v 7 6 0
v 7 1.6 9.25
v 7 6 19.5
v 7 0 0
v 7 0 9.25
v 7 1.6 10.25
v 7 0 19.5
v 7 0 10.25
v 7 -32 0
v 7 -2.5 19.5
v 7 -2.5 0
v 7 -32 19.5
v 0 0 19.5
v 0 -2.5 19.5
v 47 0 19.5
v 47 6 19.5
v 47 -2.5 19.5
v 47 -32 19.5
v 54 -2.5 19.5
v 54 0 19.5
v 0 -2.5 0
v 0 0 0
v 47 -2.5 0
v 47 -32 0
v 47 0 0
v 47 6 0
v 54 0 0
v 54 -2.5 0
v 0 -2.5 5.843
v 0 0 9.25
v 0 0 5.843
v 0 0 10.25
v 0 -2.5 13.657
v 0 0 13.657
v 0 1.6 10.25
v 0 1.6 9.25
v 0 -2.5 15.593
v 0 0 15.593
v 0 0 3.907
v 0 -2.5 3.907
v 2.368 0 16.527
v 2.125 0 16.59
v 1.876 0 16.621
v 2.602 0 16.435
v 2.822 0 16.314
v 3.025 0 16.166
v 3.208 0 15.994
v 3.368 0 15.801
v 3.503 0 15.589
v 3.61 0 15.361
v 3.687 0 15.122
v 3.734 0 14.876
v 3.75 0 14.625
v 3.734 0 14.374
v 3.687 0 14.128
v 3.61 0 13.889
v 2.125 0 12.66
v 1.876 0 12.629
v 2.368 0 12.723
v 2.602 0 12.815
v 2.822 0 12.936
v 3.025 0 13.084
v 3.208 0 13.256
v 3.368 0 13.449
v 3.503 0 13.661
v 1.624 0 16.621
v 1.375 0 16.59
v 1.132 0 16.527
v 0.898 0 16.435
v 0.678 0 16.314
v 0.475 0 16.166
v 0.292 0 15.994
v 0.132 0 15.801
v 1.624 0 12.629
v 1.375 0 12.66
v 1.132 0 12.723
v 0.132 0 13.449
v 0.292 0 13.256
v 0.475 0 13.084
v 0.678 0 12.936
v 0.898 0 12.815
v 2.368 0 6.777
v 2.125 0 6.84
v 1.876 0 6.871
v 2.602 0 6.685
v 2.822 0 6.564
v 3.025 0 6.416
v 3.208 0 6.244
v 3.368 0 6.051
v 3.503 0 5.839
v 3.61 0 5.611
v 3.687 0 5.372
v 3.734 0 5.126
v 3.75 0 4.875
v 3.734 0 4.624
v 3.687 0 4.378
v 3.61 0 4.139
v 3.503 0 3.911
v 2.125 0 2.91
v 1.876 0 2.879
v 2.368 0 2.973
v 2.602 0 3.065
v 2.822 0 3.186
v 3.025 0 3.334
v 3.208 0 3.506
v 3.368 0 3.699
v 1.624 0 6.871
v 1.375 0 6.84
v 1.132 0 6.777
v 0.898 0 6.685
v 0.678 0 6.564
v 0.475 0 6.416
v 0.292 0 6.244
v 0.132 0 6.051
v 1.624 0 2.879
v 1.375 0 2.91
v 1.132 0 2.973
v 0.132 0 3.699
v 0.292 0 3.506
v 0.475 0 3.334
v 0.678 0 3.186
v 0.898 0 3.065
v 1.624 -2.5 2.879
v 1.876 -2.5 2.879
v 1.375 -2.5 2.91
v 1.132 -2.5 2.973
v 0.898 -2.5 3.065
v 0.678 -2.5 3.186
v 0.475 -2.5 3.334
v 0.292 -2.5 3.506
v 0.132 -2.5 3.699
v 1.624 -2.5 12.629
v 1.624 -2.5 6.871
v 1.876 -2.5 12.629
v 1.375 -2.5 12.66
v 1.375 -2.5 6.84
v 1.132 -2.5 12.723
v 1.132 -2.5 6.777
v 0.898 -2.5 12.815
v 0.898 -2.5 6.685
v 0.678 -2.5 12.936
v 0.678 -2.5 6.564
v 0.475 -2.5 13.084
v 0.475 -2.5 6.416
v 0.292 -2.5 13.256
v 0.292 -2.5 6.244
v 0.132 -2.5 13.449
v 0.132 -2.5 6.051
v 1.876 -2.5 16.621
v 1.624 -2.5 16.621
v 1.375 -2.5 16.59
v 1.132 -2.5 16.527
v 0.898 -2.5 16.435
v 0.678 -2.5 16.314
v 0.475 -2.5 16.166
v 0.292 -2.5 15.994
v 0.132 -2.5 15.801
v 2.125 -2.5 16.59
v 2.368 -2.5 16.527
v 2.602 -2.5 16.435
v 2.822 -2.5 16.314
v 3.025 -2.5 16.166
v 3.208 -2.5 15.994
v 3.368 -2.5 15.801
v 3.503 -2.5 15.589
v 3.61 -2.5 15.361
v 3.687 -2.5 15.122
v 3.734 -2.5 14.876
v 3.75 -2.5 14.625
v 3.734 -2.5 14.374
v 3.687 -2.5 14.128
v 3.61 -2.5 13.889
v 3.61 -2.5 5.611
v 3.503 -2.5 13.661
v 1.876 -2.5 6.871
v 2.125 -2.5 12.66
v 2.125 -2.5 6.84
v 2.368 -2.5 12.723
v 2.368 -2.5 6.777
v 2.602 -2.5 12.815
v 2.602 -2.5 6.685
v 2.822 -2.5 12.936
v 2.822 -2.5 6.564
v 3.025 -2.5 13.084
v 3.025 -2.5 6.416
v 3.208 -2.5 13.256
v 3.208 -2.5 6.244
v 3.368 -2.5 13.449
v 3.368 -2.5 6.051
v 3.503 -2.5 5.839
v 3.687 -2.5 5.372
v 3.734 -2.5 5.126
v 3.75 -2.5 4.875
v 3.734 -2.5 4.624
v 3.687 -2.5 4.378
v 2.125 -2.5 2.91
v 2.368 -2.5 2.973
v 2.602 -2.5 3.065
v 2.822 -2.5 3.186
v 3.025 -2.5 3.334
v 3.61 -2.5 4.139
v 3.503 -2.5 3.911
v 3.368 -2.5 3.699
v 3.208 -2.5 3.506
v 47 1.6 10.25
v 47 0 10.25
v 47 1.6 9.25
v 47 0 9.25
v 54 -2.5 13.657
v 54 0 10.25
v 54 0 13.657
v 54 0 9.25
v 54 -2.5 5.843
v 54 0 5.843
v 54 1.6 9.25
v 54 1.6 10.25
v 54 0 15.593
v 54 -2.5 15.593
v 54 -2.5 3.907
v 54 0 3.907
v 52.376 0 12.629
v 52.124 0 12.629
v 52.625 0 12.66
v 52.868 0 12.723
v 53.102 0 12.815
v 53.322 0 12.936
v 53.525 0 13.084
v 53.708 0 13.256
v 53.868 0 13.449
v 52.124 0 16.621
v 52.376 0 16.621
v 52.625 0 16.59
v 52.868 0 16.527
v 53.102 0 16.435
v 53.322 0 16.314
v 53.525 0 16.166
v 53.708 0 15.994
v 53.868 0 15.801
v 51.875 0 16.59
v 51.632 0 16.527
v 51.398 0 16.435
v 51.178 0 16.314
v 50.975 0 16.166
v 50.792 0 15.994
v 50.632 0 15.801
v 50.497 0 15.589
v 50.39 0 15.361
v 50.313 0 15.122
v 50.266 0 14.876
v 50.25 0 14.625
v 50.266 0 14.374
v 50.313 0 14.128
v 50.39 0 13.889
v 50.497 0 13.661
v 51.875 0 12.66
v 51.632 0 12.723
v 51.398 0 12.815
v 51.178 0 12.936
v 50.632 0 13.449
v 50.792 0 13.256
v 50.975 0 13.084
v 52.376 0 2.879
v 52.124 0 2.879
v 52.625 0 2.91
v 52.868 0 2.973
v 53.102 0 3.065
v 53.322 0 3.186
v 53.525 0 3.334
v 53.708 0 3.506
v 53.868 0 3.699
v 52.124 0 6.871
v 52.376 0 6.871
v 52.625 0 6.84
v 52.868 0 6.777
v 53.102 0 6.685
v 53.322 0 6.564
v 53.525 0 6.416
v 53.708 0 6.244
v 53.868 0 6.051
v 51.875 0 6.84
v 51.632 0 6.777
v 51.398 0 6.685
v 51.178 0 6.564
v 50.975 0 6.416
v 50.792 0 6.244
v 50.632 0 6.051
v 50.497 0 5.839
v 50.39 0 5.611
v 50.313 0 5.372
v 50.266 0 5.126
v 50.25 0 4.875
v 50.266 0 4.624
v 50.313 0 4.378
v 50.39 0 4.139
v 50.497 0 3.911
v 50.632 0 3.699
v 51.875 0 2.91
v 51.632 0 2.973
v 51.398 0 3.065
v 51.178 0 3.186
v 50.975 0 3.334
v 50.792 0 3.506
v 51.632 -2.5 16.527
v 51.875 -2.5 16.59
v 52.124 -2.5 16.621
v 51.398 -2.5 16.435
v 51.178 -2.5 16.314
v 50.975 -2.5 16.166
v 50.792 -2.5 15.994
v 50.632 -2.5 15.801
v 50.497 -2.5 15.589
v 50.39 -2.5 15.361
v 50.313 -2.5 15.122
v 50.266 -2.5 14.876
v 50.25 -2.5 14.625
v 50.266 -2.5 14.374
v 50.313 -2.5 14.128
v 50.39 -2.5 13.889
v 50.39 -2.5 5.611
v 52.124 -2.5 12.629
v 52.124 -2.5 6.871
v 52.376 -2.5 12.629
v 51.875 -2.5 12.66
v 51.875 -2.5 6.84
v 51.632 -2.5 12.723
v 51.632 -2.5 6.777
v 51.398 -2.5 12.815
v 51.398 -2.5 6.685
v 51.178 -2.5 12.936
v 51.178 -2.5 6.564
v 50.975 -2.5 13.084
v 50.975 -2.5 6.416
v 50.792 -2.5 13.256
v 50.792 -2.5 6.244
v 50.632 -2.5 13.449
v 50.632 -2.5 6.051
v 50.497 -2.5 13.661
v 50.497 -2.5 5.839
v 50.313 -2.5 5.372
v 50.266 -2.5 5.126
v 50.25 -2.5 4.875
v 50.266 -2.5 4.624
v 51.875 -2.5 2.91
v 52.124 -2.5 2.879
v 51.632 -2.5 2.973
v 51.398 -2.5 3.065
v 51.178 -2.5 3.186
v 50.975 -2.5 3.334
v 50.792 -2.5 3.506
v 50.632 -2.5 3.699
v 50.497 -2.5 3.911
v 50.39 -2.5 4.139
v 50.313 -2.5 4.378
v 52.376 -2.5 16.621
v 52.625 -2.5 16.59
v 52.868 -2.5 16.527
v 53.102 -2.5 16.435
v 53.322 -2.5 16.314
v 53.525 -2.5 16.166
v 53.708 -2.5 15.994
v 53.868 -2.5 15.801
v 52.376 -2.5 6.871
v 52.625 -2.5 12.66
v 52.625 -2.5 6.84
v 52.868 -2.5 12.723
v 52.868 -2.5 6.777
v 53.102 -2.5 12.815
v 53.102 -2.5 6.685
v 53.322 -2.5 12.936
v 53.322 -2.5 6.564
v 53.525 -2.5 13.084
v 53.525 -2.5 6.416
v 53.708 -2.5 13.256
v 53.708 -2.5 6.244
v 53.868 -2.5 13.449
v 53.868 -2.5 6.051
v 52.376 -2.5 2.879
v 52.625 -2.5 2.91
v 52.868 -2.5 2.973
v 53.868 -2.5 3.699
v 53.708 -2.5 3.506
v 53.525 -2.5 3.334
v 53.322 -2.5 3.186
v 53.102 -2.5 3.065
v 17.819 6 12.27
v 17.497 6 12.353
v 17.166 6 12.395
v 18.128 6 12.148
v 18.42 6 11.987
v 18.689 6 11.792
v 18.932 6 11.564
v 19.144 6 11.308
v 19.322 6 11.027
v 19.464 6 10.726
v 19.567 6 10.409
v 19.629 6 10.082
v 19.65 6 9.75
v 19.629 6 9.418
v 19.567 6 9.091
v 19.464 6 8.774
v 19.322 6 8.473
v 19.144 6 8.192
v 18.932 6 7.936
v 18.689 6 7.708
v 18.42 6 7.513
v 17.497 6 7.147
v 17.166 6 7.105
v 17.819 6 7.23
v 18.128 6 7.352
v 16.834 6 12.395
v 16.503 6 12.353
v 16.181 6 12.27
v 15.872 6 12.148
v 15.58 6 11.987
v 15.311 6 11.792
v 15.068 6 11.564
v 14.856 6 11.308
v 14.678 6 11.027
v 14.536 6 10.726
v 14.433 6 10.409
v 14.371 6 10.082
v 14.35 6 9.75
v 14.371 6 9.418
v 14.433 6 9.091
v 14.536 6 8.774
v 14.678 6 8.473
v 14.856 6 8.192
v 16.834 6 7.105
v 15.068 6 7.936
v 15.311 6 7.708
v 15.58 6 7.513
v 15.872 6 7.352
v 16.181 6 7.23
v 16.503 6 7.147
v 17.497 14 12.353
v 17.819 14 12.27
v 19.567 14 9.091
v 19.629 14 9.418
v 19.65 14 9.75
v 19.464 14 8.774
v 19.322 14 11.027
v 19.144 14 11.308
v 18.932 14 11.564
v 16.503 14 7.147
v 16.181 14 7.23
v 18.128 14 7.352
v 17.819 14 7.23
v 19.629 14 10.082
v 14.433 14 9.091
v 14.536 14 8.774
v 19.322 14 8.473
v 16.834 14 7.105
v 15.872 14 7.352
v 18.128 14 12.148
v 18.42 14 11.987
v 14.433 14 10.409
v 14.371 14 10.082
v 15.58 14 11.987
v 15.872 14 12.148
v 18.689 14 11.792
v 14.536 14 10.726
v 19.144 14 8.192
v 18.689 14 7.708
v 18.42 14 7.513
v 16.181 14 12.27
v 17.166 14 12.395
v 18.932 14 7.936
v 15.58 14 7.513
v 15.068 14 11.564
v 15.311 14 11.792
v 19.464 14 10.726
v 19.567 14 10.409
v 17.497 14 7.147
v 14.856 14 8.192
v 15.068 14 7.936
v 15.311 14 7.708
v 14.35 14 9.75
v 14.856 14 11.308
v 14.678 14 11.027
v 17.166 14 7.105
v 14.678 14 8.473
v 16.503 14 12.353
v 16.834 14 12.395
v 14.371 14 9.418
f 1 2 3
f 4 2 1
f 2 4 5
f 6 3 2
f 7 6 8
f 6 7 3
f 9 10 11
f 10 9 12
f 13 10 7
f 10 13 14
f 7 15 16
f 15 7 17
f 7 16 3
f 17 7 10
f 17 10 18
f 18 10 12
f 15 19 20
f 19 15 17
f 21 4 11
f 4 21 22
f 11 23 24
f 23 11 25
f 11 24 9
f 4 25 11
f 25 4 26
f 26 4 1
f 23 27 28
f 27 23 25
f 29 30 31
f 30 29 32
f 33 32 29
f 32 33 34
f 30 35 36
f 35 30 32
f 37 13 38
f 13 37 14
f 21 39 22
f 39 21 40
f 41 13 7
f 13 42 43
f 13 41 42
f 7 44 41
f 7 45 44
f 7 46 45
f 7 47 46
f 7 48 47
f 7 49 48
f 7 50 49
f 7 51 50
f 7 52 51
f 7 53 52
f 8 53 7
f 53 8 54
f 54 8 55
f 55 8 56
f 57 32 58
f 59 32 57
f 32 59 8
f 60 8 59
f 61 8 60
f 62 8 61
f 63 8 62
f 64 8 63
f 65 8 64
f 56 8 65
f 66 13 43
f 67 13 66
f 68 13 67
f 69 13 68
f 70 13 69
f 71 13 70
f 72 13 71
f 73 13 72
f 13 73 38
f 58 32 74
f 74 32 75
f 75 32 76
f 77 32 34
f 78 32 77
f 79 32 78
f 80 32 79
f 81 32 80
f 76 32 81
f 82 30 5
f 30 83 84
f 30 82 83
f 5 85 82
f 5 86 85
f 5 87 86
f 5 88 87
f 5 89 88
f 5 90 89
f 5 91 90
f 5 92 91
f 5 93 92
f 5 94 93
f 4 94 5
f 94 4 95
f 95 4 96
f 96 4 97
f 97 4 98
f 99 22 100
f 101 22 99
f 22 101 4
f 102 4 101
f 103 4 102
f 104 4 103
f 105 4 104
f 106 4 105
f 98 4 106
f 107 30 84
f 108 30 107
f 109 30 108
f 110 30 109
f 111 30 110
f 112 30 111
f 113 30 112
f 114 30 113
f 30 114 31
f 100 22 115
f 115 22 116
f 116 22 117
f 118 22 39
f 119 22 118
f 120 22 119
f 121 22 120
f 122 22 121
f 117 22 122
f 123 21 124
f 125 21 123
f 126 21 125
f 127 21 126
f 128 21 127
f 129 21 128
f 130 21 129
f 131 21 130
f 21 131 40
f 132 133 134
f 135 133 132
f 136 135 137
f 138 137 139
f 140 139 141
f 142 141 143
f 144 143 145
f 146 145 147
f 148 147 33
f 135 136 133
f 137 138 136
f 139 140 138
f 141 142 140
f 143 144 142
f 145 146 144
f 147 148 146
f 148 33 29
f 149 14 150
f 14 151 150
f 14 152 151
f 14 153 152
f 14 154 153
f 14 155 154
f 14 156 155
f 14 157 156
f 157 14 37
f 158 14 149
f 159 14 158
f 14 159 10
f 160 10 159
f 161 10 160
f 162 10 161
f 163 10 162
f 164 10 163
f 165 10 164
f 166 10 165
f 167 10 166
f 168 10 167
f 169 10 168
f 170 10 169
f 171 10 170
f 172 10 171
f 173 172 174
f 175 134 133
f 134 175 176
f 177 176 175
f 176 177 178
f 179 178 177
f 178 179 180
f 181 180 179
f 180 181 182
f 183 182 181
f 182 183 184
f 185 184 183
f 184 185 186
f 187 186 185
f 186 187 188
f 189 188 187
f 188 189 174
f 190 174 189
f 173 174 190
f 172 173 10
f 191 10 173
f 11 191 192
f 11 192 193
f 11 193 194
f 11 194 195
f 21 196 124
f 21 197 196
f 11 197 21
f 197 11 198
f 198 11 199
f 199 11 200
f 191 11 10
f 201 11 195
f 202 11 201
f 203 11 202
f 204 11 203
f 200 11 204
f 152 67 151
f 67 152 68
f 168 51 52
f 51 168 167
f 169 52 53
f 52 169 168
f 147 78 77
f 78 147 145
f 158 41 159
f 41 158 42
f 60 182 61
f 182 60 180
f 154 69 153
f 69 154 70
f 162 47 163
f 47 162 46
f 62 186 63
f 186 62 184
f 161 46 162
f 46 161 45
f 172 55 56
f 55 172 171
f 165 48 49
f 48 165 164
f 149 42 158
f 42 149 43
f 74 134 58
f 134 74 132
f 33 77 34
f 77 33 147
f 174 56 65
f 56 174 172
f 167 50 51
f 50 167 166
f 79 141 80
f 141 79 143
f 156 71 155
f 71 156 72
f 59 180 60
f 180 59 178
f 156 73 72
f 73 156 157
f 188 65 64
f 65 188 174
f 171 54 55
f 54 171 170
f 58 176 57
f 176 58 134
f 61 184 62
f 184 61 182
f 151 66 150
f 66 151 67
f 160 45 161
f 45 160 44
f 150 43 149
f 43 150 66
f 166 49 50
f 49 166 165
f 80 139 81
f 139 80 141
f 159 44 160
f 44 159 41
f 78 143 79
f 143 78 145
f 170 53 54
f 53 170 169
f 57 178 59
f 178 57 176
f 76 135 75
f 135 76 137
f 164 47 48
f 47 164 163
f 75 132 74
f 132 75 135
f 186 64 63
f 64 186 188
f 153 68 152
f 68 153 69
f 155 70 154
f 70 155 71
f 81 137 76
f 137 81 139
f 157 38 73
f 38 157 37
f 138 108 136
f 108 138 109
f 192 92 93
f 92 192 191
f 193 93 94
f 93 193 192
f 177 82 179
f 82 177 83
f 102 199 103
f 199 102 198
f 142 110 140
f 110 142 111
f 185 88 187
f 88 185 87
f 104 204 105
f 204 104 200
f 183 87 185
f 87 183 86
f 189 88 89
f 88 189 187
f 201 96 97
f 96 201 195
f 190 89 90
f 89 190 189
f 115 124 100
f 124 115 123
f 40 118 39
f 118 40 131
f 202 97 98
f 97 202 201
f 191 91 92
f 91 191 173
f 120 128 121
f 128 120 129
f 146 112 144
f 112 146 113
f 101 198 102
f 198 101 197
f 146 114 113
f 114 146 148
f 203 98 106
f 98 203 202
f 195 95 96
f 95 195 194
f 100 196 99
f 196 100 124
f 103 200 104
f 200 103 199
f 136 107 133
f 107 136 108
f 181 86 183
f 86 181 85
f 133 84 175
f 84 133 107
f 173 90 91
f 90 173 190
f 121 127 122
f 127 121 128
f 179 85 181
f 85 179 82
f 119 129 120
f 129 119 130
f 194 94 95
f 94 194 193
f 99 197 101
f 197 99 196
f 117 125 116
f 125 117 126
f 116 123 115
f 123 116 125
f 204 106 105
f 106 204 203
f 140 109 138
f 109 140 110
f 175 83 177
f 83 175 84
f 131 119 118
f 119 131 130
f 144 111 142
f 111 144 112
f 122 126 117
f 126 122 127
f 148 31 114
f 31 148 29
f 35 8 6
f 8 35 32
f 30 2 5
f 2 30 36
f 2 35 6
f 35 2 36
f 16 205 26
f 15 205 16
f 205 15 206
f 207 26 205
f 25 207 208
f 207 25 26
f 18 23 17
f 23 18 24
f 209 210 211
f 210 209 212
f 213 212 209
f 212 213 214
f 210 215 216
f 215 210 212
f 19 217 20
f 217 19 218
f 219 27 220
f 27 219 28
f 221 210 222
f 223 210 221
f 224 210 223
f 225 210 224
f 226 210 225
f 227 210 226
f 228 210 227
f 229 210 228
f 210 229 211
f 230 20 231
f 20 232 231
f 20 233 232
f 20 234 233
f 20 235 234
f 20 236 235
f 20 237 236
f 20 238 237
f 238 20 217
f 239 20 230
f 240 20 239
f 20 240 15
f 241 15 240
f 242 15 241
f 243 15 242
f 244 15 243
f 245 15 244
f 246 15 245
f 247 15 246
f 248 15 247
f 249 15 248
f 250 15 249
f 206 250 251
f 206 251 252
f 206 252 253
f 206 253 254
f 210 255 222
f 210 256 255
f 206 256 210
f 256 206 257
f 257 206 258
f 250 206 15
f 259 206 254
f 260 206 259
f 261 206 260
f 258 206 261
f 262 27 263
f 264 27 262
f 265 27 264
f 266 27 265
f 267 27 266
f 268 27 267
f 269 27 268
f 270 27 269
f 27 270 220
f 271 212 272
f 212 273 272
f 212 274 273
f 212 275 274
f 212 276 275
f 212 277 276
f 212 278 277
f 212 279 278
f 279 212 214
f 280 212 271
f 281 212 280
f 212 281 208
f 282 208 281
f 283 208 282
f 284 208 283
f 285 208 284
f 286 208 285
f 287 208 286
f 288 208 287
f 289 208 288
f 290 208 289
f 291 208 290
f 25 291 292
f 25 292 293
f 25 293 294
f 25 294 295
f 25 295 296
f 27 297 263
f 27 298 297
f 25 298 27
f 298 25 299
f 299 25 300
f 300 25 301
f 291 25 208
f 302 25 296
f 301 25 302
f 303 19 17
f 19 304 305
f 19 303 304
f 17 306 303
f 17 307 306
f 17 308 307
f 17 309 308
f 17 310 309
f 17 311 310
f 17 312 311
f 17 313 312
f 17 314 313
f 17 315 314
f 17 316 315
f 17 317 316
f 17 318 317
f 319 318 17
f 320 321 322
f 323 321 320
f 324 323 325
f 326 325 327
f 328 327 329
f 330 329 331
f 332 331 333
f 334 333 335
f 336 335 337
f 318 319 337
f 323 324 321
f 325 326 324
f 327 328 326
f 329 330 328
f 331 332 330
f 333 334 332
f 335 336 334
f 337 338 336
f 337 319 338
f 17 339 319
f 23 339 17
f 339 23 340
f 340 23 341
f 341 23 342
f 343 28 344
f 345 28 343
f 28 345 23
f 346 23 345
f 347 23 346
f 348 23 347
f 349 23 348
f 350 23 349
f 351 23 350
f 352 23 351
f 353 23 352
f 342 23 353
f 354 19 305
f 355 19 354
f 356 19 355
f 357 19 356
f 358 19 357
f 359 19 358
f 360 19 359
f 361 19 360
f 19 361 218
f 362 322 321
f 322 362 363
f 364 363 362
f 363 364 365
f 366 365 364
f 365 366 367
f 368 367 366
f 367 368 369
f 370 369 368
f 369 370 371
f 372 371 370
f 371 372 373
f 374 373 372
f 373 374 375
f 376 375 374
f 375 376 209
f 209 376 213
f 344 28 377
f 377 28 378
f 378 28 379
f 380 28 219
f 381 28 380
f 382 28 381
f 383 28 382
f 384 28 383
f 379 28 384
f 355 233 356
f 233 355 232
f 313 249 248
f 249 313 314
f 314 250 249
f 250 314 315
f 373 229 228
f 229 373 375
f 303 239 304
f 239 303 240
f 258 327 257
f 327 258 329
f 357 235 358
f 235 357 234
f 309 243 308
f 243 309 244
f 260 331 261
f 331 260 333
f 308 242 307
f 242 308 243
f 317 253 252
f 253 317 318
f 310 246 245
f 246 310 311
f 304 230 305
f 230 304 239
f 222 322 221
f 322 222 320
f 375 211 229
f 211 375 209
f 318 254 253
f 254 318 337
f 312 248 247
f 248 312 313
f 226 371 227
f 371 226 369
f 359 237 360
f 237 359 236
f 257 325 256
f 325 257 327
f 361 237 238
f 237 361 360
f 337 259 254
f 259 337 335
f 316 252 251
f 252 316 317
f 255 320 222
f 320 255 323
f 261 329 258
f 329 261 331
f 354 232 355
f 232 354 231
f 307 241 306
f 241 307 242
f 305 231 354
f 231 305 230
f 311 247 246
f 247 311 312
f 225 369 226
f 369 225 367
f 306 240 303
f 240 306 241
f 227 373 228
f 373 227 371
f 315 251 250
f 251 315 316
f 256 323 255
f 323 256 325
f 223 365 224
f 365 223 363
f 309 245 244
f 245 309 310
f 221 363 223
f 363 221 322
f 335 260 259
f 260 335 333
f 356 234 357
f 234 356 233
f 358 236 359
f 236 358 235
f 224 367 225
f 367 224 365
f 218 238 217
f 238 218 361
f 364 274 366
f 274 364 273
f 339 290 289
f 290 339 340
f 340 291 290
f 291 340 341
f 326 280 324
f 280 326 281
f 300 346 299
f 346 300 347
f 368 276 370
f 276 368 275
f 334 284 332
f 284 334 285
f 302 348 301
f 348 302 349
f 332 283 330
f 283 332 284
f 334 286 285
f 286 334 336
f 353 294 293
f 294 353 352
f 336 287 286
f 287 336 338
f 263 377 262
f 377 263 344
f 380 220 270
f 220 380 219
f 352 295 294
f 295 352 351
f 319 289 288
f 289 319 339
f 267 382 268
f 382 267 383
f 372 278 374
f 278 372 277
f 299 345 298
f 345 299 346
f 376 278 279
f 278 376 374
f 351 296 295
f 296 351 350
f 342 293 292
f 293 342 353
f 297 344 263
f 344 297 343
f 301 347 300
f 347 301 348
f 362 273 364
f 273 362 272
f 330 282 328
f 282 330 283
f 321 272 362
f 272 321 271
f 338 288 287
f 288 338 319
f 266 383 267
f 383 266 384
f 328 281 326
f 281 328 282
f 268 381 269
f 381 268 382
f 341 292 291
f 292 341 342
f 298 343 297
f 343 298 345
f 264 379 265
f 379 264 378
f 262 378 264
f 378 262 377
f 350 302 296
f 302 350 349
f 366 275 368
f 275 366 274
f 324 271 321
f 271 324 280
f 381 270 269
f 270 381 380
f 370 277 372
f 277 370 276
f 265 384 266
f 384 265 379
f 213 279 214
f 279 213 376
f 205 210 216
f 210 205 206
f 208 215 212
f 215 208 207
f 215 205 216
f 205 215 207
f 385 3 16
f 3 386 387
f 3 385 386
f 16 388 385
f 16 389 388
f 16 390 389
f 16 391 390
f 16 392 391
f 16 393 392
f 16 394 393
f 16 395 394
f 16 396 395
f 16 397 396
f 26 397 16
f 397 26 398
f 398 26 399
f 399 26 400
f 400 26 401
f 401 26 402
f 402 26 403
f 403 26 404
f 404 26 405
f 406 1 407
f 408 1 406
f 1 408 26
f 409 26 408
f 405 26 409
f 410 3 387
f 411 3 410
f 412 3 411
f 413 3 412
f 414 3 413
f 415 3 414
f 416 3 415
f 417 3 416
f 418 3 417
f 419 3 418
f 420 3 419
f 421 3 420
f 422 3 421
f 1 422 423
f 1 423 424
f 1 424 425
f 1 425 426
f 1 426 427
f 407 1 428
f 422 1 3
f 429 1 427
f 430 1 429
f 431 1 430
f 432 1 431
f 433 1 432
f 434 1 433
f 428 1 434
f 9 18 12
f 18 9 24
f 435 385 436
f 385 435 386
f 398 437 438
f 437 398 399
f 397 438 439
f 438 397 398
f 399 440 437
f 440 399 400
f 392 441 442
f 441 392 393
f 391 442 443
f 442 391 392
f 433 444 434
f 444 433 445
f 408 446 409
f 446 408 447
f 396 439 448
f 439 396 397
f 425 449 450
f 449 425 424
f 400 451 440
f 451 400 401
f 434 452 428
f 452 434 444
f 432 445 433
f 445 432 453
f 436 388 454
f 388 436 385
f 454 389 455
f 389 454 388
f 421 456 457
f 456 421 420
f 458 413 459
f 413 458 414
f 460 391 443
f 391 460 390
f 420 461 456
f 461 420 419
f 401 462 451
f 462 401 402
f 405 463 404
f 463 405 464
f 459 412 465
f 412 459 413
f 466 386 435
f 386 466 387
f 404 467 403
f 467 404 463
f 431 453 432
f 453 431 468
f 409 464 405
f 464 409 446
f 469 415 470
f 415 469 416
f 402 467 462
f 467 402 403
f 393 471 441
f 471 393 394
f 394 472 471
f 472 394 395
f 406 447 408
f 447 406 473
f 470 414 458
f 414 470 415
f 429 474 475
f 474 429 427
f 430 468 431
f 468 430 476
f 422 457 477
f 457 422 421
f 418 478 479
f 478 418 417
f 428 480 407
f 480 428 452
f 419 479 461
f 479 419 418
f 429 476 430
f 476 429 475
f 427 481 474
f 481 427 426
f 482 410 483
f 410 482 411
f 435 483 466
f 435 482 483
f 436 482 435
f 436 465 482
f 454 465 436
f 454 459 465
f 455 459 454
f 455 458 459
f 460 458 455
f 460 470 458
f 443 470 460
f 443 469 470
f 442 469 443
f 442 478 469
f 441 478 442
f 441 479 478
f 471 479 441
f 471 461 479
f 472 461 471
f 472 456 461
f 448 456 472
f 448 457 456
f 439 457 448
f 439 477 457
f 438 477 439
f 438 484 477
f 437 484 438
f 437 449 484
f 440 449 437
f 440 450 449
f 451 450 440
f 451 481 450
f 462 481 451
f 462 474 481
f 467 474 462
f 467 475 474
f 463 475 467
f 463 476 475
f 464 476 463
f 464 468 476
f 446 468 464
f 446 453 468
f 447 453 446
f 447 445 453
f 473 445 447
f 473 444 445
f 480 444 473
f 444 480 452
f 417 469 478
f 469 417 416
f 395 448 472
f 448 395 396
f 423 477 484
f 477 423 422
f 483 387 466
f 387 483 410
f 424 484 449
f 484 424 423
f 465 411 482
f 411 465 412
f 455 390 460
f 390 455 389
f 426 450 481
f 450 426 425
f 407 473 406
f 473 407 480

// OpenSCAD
$fn = 50;

module mock_servo() {
  mock_servo = [40, 38, 19.5];
  bracket = [7, 2.5, 19.5];

  translate([0, -bracket.y, 0]) bracket(bracket); // Left bracket
  translate([(bracket.x * 2) + mock_servo.x, -bracket.y, 0]) mirror([1, 0, 0]) bracket(bracket); // Right bracket
  translate([bracket.x, 6, 0]) { // 6mm from front to bracket
    translate([0, -mock_servo.y, 0]) cube(mock_servo);
    color("white") translate([10, 0, mock_servo.z / 2]) rotate([-90, 0, 0]) cylinder(h=8, d=5.3); // Horn mount
  }
}

module bracket(bracket) {
  line = [7, 1.6, 1];
  hole_diameter = 4;

    difference() {
      cube(bracket); // Main body
      translate([bracket.x / 4, bracket.y + 1, (bracket.z / 4) * 3]) rotate([90, 0, 0]) cylinder(h=bracket.y + 2, d=hole_diameter); // Top hole
      translate([bracket.x / 4, bracket.y + 1, bracket.z / 4]) rotate([90, 0, 0]) cylinder(h=bracket.y + 2, d=hole_diameter); // Bottom hole
    }

    translate([0, bracket.y, (bracket.z / 2) - (line.z / 2)]) cube(line); // Raised line
}

mock_servo();
